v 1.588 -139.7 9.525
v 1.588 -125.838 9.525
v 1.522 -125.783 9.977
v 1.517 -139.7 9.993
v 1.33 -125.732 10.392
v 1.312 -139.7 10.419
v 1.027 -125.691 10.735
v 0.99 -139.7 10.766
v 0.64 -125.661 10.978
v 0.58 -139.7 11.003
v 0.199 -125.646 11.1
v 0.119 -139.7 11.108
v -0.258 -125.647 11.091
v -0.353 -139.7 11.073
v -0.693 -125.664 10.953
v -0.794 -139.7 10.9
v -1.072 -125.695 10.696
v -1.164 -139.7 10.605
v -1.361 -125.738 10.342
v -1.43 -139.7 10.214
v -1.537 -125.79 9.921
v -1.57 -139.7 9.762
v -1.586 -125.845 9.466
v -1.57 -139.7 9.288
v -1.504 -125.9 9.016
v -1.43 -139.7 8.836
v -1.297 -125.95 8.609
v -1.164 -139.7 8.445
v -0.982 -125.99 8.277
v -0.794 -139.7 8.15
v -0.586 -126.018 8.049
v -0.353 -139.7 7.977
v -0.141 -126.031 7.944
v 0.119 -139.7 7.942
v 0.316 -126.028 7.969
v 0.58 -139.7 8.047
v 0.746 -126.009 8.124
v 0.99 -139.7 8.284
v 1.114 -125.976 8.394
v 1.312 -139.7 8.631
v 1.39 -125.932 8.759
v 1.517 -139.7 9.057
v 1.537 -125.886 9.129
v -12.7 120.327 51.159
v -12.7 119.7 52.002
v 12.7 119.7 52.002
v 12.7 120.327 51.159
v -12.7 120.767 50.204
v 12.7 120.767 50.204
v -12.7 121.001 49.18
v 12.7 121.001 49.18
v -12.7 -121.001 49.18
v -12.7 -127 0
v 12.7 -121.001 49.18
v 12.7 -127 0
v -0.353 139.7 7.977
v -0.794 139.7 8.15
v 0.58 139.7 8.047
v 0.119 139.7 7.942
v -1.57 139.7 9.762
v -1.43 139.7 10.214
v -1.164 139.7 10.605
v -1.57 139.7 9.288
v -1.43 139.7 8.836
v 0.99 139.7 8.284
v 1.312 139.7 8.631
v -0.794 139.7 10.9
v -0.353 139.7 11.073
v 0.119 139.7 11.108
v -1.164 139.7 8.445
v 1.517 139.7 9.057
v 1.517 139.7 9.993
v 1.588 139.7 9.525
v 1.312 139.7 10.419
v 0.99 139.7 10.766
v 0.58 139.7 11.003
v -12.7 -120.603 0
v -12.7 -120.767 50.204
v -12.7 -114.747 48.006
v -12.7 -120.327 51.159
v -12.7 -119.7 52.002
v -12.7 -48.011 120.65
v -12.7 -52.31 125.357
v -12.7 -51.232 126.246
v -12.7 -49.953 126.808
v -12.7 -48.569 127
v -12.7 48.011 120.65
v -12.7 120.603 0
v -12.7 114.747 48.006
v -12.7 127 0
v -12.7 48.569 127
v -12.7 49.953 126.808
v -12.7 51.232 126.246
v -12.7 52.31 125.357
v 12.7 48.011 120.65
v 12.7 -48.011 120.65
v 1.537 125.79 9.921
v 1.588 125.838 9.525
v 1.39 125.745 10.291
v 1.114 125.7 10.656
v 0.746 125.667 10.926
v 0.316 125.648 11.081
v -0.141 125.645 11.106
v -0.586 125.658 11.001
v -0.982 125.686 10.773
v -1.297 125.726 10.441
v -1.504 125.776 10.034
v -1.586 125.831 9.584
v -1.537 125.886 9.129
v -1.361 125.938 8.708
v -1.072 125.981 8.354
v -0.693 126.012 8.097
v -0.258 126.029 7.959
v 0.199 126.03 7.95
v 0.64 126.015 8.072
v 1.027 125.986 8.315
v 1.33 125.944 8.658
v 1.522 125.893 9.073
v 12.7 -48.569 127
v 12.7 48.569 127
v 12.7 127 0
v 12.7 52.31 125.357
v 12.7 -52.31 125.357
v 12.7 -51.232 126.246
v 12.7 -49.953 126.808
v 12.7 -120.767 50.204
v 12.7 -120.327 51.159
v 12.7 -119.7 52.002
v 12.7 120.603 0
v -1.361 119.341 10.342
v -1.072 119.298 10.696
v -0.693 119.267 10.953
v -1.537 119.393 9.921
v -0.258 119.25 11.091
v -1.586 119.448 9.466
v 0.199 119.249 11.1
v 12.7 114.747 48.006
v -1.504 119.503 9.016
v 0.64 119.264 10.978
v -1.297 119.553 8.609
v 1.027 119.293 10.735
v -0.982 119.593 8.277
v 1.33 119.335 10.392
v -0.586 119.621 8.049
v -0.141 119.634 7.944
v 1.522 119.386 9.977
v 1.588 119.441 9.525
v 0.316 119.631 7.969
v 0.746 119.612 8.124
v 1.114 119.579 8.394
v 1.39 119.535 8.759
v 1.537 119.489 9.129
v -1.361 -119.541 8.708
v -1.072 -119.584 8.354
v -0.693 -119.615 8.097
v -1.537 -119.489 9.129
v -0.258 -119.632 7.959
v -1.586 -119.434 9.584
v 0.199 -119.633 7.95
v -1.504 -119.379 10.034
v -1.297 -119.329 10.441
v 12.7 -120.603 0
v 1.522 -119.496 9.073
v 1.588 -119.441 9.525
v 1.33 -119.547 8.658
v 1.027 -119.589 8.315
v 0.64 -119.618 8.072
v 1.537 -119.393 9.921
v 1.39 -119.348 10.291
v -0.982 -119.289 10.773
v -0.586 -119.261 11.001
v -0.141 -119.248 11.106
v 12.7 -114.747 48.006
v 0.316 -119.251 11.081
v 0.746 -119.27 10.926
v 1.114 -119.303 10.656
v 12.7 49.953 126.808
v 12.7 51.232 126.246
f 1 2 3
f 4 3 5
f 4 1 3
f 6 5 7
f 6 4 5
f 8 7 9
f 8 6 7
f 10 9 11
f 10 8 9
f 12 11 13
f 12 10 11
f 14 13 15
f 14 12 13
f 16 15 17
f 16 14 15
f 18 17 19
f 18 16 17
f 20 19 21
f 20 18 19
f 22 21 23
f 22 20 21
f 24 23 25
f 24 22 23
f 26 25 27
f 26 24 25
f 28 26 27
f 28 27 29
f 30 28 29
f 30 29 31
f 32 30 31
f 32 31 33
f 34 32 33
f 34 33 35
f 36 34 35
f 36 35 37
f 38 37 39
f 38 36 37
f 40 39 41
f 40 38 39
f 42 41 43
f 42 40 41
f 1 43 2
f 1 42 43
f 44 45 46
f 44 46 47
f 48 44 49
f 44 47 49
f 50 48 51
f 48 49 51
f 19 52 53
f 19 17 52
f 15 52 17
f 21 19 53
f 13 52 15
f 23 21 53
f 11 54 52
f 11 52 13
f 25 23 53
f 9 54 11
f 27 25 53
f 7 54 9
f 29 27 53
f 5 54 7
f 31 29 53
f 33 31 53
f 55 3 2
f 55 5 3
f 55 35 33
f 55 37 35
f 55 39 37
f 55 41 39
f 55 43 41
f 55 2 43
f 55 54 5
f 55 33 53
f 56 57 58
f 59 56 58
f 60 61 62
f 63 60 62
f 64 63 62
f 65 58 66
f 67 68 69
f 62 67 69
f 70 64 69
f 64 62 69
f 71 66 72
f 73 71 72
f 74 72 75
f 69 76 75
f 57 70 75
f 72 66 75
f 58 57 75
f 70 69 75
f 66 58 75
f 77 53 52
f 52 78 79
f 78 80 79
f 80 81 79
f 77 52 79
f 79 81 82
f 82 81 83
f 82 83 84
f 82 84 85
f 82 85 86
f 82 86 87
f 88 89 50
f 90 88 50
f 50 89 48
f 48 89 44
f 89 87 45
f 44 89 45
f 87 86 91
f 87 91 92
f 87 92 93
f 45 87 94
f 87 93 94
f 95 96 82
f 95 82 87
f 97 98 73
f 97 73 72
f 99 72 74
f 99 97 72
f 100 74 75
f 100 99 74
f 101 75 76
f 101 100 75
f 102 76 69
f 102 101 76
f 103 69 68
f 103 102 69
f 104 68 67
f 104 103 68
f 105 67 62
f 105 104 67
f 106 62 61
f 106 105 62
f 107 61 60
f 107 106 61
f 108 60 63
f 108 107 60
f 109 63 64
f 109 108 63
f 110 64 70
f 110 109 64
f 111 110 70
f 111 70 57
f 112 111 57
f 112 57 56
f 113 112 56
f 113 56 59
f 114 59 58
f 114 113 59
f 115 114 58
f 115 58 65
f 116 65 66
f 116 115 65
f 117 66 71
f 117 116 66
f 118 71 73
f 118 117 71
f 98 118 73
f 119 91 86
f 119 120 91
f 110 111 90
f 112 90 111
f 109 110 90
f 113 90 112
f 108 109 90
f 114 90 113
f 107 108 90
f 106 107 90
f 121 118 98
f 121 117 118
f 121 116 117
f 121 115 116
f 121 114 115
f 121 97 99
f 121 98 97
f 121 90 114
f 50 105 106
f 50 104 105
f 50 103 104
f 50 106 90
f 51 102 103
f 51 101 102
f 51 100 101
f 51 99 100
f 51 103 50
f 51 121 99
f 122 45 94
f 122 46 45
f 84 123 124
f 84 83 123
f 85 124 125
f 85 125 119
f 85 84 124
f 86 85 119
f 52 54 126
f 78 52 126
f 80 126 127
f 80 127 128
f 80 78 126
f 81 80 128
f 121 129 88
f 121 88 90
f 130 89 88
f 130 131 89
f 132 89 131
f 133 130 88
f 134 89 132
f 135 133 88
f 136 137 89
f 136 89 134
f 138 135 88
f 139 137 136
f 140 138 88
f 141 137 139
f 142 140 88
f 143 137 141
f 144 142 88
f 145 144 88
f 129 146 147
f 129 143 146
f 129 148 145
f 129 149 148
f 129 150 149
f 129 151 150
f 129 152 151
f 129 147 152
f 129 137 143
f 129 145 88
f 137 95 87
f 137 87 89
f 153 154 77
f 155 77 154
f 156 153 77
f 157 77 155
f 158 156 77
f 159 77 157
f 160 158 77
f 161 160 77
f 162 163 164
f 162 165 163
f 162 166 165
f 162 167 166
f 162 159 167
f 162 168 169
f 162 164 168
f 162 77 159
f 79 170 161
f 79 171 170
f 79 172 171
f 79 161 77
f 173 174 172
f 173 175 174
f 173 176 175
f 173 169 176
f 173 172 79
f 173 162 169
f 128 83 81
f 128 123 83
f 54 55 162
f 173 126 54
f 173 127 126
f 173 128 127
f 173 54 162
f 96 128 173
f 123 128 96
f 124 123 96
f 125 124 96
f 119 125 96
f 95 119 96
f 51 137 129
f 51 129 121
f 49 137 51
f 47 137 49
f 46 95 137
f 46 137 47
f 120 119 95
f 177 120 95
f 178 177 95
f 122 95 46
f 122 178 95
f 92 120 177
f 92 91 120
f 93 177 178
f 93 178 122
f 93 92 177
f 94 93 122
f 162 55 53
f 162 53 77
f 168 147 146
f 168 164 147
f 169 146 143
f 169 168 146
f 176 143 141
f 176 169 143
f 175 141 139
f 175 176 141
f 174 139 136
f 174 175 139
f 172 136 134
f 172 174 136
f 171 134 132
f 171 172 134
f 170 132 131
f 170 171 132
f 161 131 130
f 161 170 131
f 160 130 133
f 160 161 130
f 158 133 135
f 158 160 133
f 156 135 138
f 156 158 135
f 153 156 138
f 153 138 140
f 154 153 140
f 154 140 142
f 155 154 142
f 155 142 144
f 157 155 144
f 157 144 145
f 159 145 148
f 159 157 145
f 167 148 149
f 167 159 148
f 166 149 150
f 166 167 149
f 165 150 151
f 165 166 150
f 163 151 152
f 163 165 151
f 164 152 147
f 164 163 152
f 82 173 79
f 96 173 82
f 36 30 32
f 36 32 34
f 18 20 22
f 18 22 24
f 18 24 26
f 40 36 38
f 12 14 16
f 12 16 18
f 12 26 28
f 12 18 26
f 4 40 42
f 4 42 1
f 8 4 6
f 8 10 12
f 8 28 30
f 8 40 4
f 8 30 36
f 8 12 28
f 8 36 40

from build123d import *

# Parameters (mm, degrees)
F1_DEPTH = 12.7
F2_R     = 5.08
F3_R     = 1.5875
F4_DEPTH = 254
F5_R     = 1.5875
F6_DEPTH = 139.7


with BuildPart() as f1:
    # F0 (on Right) → F1 (new body, symmetric)
    with BuildSketch(Plane.YZ):
        Polygon((-120.803595, 50.8), (-127, 0), (-120.60294, 0), (-114.747306, 48.006249), (-48.010771, 120.650004), (0, 120.650004), (48.010771, 120.650004), (114.747306, 48.006249), (120.60294, 0), (127, 0), (120.803595, 50.8), (50.8, 127), (0, 127), (-50.8, 127), align=None)
    extrude(amount=F1_DEPTH, both=True)

    # F2
    f2_edges = [f1.edges().sort_by_distance(p)[0] for p in [
        (0, -120.803595, 50.8),
        (0, 120.803595, 50.8),
        (0, -50.8, 127),
        (0, 50.8, 127),
    ]]
    fillet(f2_edges, radius=F2_R)

    # F3 (on Front) → F4 (cut, symmetric)
    with BuildSketch(Plane.XZ):
        with Locations((0, 9.525)):
            Circle(F3_R)
    extrude(amount=F4_DEPTH, both=True, mode=Mode.SUBTRACT)

    # F5 (on Front) → F6 (join, symmetric)
    with BuildSketch(Plane.XZ):
        with Locations((0, 9.525)):
            Circle(F5_R)
    extrude(amount=F6_DEPTH, both=True)


solid = f1.part
